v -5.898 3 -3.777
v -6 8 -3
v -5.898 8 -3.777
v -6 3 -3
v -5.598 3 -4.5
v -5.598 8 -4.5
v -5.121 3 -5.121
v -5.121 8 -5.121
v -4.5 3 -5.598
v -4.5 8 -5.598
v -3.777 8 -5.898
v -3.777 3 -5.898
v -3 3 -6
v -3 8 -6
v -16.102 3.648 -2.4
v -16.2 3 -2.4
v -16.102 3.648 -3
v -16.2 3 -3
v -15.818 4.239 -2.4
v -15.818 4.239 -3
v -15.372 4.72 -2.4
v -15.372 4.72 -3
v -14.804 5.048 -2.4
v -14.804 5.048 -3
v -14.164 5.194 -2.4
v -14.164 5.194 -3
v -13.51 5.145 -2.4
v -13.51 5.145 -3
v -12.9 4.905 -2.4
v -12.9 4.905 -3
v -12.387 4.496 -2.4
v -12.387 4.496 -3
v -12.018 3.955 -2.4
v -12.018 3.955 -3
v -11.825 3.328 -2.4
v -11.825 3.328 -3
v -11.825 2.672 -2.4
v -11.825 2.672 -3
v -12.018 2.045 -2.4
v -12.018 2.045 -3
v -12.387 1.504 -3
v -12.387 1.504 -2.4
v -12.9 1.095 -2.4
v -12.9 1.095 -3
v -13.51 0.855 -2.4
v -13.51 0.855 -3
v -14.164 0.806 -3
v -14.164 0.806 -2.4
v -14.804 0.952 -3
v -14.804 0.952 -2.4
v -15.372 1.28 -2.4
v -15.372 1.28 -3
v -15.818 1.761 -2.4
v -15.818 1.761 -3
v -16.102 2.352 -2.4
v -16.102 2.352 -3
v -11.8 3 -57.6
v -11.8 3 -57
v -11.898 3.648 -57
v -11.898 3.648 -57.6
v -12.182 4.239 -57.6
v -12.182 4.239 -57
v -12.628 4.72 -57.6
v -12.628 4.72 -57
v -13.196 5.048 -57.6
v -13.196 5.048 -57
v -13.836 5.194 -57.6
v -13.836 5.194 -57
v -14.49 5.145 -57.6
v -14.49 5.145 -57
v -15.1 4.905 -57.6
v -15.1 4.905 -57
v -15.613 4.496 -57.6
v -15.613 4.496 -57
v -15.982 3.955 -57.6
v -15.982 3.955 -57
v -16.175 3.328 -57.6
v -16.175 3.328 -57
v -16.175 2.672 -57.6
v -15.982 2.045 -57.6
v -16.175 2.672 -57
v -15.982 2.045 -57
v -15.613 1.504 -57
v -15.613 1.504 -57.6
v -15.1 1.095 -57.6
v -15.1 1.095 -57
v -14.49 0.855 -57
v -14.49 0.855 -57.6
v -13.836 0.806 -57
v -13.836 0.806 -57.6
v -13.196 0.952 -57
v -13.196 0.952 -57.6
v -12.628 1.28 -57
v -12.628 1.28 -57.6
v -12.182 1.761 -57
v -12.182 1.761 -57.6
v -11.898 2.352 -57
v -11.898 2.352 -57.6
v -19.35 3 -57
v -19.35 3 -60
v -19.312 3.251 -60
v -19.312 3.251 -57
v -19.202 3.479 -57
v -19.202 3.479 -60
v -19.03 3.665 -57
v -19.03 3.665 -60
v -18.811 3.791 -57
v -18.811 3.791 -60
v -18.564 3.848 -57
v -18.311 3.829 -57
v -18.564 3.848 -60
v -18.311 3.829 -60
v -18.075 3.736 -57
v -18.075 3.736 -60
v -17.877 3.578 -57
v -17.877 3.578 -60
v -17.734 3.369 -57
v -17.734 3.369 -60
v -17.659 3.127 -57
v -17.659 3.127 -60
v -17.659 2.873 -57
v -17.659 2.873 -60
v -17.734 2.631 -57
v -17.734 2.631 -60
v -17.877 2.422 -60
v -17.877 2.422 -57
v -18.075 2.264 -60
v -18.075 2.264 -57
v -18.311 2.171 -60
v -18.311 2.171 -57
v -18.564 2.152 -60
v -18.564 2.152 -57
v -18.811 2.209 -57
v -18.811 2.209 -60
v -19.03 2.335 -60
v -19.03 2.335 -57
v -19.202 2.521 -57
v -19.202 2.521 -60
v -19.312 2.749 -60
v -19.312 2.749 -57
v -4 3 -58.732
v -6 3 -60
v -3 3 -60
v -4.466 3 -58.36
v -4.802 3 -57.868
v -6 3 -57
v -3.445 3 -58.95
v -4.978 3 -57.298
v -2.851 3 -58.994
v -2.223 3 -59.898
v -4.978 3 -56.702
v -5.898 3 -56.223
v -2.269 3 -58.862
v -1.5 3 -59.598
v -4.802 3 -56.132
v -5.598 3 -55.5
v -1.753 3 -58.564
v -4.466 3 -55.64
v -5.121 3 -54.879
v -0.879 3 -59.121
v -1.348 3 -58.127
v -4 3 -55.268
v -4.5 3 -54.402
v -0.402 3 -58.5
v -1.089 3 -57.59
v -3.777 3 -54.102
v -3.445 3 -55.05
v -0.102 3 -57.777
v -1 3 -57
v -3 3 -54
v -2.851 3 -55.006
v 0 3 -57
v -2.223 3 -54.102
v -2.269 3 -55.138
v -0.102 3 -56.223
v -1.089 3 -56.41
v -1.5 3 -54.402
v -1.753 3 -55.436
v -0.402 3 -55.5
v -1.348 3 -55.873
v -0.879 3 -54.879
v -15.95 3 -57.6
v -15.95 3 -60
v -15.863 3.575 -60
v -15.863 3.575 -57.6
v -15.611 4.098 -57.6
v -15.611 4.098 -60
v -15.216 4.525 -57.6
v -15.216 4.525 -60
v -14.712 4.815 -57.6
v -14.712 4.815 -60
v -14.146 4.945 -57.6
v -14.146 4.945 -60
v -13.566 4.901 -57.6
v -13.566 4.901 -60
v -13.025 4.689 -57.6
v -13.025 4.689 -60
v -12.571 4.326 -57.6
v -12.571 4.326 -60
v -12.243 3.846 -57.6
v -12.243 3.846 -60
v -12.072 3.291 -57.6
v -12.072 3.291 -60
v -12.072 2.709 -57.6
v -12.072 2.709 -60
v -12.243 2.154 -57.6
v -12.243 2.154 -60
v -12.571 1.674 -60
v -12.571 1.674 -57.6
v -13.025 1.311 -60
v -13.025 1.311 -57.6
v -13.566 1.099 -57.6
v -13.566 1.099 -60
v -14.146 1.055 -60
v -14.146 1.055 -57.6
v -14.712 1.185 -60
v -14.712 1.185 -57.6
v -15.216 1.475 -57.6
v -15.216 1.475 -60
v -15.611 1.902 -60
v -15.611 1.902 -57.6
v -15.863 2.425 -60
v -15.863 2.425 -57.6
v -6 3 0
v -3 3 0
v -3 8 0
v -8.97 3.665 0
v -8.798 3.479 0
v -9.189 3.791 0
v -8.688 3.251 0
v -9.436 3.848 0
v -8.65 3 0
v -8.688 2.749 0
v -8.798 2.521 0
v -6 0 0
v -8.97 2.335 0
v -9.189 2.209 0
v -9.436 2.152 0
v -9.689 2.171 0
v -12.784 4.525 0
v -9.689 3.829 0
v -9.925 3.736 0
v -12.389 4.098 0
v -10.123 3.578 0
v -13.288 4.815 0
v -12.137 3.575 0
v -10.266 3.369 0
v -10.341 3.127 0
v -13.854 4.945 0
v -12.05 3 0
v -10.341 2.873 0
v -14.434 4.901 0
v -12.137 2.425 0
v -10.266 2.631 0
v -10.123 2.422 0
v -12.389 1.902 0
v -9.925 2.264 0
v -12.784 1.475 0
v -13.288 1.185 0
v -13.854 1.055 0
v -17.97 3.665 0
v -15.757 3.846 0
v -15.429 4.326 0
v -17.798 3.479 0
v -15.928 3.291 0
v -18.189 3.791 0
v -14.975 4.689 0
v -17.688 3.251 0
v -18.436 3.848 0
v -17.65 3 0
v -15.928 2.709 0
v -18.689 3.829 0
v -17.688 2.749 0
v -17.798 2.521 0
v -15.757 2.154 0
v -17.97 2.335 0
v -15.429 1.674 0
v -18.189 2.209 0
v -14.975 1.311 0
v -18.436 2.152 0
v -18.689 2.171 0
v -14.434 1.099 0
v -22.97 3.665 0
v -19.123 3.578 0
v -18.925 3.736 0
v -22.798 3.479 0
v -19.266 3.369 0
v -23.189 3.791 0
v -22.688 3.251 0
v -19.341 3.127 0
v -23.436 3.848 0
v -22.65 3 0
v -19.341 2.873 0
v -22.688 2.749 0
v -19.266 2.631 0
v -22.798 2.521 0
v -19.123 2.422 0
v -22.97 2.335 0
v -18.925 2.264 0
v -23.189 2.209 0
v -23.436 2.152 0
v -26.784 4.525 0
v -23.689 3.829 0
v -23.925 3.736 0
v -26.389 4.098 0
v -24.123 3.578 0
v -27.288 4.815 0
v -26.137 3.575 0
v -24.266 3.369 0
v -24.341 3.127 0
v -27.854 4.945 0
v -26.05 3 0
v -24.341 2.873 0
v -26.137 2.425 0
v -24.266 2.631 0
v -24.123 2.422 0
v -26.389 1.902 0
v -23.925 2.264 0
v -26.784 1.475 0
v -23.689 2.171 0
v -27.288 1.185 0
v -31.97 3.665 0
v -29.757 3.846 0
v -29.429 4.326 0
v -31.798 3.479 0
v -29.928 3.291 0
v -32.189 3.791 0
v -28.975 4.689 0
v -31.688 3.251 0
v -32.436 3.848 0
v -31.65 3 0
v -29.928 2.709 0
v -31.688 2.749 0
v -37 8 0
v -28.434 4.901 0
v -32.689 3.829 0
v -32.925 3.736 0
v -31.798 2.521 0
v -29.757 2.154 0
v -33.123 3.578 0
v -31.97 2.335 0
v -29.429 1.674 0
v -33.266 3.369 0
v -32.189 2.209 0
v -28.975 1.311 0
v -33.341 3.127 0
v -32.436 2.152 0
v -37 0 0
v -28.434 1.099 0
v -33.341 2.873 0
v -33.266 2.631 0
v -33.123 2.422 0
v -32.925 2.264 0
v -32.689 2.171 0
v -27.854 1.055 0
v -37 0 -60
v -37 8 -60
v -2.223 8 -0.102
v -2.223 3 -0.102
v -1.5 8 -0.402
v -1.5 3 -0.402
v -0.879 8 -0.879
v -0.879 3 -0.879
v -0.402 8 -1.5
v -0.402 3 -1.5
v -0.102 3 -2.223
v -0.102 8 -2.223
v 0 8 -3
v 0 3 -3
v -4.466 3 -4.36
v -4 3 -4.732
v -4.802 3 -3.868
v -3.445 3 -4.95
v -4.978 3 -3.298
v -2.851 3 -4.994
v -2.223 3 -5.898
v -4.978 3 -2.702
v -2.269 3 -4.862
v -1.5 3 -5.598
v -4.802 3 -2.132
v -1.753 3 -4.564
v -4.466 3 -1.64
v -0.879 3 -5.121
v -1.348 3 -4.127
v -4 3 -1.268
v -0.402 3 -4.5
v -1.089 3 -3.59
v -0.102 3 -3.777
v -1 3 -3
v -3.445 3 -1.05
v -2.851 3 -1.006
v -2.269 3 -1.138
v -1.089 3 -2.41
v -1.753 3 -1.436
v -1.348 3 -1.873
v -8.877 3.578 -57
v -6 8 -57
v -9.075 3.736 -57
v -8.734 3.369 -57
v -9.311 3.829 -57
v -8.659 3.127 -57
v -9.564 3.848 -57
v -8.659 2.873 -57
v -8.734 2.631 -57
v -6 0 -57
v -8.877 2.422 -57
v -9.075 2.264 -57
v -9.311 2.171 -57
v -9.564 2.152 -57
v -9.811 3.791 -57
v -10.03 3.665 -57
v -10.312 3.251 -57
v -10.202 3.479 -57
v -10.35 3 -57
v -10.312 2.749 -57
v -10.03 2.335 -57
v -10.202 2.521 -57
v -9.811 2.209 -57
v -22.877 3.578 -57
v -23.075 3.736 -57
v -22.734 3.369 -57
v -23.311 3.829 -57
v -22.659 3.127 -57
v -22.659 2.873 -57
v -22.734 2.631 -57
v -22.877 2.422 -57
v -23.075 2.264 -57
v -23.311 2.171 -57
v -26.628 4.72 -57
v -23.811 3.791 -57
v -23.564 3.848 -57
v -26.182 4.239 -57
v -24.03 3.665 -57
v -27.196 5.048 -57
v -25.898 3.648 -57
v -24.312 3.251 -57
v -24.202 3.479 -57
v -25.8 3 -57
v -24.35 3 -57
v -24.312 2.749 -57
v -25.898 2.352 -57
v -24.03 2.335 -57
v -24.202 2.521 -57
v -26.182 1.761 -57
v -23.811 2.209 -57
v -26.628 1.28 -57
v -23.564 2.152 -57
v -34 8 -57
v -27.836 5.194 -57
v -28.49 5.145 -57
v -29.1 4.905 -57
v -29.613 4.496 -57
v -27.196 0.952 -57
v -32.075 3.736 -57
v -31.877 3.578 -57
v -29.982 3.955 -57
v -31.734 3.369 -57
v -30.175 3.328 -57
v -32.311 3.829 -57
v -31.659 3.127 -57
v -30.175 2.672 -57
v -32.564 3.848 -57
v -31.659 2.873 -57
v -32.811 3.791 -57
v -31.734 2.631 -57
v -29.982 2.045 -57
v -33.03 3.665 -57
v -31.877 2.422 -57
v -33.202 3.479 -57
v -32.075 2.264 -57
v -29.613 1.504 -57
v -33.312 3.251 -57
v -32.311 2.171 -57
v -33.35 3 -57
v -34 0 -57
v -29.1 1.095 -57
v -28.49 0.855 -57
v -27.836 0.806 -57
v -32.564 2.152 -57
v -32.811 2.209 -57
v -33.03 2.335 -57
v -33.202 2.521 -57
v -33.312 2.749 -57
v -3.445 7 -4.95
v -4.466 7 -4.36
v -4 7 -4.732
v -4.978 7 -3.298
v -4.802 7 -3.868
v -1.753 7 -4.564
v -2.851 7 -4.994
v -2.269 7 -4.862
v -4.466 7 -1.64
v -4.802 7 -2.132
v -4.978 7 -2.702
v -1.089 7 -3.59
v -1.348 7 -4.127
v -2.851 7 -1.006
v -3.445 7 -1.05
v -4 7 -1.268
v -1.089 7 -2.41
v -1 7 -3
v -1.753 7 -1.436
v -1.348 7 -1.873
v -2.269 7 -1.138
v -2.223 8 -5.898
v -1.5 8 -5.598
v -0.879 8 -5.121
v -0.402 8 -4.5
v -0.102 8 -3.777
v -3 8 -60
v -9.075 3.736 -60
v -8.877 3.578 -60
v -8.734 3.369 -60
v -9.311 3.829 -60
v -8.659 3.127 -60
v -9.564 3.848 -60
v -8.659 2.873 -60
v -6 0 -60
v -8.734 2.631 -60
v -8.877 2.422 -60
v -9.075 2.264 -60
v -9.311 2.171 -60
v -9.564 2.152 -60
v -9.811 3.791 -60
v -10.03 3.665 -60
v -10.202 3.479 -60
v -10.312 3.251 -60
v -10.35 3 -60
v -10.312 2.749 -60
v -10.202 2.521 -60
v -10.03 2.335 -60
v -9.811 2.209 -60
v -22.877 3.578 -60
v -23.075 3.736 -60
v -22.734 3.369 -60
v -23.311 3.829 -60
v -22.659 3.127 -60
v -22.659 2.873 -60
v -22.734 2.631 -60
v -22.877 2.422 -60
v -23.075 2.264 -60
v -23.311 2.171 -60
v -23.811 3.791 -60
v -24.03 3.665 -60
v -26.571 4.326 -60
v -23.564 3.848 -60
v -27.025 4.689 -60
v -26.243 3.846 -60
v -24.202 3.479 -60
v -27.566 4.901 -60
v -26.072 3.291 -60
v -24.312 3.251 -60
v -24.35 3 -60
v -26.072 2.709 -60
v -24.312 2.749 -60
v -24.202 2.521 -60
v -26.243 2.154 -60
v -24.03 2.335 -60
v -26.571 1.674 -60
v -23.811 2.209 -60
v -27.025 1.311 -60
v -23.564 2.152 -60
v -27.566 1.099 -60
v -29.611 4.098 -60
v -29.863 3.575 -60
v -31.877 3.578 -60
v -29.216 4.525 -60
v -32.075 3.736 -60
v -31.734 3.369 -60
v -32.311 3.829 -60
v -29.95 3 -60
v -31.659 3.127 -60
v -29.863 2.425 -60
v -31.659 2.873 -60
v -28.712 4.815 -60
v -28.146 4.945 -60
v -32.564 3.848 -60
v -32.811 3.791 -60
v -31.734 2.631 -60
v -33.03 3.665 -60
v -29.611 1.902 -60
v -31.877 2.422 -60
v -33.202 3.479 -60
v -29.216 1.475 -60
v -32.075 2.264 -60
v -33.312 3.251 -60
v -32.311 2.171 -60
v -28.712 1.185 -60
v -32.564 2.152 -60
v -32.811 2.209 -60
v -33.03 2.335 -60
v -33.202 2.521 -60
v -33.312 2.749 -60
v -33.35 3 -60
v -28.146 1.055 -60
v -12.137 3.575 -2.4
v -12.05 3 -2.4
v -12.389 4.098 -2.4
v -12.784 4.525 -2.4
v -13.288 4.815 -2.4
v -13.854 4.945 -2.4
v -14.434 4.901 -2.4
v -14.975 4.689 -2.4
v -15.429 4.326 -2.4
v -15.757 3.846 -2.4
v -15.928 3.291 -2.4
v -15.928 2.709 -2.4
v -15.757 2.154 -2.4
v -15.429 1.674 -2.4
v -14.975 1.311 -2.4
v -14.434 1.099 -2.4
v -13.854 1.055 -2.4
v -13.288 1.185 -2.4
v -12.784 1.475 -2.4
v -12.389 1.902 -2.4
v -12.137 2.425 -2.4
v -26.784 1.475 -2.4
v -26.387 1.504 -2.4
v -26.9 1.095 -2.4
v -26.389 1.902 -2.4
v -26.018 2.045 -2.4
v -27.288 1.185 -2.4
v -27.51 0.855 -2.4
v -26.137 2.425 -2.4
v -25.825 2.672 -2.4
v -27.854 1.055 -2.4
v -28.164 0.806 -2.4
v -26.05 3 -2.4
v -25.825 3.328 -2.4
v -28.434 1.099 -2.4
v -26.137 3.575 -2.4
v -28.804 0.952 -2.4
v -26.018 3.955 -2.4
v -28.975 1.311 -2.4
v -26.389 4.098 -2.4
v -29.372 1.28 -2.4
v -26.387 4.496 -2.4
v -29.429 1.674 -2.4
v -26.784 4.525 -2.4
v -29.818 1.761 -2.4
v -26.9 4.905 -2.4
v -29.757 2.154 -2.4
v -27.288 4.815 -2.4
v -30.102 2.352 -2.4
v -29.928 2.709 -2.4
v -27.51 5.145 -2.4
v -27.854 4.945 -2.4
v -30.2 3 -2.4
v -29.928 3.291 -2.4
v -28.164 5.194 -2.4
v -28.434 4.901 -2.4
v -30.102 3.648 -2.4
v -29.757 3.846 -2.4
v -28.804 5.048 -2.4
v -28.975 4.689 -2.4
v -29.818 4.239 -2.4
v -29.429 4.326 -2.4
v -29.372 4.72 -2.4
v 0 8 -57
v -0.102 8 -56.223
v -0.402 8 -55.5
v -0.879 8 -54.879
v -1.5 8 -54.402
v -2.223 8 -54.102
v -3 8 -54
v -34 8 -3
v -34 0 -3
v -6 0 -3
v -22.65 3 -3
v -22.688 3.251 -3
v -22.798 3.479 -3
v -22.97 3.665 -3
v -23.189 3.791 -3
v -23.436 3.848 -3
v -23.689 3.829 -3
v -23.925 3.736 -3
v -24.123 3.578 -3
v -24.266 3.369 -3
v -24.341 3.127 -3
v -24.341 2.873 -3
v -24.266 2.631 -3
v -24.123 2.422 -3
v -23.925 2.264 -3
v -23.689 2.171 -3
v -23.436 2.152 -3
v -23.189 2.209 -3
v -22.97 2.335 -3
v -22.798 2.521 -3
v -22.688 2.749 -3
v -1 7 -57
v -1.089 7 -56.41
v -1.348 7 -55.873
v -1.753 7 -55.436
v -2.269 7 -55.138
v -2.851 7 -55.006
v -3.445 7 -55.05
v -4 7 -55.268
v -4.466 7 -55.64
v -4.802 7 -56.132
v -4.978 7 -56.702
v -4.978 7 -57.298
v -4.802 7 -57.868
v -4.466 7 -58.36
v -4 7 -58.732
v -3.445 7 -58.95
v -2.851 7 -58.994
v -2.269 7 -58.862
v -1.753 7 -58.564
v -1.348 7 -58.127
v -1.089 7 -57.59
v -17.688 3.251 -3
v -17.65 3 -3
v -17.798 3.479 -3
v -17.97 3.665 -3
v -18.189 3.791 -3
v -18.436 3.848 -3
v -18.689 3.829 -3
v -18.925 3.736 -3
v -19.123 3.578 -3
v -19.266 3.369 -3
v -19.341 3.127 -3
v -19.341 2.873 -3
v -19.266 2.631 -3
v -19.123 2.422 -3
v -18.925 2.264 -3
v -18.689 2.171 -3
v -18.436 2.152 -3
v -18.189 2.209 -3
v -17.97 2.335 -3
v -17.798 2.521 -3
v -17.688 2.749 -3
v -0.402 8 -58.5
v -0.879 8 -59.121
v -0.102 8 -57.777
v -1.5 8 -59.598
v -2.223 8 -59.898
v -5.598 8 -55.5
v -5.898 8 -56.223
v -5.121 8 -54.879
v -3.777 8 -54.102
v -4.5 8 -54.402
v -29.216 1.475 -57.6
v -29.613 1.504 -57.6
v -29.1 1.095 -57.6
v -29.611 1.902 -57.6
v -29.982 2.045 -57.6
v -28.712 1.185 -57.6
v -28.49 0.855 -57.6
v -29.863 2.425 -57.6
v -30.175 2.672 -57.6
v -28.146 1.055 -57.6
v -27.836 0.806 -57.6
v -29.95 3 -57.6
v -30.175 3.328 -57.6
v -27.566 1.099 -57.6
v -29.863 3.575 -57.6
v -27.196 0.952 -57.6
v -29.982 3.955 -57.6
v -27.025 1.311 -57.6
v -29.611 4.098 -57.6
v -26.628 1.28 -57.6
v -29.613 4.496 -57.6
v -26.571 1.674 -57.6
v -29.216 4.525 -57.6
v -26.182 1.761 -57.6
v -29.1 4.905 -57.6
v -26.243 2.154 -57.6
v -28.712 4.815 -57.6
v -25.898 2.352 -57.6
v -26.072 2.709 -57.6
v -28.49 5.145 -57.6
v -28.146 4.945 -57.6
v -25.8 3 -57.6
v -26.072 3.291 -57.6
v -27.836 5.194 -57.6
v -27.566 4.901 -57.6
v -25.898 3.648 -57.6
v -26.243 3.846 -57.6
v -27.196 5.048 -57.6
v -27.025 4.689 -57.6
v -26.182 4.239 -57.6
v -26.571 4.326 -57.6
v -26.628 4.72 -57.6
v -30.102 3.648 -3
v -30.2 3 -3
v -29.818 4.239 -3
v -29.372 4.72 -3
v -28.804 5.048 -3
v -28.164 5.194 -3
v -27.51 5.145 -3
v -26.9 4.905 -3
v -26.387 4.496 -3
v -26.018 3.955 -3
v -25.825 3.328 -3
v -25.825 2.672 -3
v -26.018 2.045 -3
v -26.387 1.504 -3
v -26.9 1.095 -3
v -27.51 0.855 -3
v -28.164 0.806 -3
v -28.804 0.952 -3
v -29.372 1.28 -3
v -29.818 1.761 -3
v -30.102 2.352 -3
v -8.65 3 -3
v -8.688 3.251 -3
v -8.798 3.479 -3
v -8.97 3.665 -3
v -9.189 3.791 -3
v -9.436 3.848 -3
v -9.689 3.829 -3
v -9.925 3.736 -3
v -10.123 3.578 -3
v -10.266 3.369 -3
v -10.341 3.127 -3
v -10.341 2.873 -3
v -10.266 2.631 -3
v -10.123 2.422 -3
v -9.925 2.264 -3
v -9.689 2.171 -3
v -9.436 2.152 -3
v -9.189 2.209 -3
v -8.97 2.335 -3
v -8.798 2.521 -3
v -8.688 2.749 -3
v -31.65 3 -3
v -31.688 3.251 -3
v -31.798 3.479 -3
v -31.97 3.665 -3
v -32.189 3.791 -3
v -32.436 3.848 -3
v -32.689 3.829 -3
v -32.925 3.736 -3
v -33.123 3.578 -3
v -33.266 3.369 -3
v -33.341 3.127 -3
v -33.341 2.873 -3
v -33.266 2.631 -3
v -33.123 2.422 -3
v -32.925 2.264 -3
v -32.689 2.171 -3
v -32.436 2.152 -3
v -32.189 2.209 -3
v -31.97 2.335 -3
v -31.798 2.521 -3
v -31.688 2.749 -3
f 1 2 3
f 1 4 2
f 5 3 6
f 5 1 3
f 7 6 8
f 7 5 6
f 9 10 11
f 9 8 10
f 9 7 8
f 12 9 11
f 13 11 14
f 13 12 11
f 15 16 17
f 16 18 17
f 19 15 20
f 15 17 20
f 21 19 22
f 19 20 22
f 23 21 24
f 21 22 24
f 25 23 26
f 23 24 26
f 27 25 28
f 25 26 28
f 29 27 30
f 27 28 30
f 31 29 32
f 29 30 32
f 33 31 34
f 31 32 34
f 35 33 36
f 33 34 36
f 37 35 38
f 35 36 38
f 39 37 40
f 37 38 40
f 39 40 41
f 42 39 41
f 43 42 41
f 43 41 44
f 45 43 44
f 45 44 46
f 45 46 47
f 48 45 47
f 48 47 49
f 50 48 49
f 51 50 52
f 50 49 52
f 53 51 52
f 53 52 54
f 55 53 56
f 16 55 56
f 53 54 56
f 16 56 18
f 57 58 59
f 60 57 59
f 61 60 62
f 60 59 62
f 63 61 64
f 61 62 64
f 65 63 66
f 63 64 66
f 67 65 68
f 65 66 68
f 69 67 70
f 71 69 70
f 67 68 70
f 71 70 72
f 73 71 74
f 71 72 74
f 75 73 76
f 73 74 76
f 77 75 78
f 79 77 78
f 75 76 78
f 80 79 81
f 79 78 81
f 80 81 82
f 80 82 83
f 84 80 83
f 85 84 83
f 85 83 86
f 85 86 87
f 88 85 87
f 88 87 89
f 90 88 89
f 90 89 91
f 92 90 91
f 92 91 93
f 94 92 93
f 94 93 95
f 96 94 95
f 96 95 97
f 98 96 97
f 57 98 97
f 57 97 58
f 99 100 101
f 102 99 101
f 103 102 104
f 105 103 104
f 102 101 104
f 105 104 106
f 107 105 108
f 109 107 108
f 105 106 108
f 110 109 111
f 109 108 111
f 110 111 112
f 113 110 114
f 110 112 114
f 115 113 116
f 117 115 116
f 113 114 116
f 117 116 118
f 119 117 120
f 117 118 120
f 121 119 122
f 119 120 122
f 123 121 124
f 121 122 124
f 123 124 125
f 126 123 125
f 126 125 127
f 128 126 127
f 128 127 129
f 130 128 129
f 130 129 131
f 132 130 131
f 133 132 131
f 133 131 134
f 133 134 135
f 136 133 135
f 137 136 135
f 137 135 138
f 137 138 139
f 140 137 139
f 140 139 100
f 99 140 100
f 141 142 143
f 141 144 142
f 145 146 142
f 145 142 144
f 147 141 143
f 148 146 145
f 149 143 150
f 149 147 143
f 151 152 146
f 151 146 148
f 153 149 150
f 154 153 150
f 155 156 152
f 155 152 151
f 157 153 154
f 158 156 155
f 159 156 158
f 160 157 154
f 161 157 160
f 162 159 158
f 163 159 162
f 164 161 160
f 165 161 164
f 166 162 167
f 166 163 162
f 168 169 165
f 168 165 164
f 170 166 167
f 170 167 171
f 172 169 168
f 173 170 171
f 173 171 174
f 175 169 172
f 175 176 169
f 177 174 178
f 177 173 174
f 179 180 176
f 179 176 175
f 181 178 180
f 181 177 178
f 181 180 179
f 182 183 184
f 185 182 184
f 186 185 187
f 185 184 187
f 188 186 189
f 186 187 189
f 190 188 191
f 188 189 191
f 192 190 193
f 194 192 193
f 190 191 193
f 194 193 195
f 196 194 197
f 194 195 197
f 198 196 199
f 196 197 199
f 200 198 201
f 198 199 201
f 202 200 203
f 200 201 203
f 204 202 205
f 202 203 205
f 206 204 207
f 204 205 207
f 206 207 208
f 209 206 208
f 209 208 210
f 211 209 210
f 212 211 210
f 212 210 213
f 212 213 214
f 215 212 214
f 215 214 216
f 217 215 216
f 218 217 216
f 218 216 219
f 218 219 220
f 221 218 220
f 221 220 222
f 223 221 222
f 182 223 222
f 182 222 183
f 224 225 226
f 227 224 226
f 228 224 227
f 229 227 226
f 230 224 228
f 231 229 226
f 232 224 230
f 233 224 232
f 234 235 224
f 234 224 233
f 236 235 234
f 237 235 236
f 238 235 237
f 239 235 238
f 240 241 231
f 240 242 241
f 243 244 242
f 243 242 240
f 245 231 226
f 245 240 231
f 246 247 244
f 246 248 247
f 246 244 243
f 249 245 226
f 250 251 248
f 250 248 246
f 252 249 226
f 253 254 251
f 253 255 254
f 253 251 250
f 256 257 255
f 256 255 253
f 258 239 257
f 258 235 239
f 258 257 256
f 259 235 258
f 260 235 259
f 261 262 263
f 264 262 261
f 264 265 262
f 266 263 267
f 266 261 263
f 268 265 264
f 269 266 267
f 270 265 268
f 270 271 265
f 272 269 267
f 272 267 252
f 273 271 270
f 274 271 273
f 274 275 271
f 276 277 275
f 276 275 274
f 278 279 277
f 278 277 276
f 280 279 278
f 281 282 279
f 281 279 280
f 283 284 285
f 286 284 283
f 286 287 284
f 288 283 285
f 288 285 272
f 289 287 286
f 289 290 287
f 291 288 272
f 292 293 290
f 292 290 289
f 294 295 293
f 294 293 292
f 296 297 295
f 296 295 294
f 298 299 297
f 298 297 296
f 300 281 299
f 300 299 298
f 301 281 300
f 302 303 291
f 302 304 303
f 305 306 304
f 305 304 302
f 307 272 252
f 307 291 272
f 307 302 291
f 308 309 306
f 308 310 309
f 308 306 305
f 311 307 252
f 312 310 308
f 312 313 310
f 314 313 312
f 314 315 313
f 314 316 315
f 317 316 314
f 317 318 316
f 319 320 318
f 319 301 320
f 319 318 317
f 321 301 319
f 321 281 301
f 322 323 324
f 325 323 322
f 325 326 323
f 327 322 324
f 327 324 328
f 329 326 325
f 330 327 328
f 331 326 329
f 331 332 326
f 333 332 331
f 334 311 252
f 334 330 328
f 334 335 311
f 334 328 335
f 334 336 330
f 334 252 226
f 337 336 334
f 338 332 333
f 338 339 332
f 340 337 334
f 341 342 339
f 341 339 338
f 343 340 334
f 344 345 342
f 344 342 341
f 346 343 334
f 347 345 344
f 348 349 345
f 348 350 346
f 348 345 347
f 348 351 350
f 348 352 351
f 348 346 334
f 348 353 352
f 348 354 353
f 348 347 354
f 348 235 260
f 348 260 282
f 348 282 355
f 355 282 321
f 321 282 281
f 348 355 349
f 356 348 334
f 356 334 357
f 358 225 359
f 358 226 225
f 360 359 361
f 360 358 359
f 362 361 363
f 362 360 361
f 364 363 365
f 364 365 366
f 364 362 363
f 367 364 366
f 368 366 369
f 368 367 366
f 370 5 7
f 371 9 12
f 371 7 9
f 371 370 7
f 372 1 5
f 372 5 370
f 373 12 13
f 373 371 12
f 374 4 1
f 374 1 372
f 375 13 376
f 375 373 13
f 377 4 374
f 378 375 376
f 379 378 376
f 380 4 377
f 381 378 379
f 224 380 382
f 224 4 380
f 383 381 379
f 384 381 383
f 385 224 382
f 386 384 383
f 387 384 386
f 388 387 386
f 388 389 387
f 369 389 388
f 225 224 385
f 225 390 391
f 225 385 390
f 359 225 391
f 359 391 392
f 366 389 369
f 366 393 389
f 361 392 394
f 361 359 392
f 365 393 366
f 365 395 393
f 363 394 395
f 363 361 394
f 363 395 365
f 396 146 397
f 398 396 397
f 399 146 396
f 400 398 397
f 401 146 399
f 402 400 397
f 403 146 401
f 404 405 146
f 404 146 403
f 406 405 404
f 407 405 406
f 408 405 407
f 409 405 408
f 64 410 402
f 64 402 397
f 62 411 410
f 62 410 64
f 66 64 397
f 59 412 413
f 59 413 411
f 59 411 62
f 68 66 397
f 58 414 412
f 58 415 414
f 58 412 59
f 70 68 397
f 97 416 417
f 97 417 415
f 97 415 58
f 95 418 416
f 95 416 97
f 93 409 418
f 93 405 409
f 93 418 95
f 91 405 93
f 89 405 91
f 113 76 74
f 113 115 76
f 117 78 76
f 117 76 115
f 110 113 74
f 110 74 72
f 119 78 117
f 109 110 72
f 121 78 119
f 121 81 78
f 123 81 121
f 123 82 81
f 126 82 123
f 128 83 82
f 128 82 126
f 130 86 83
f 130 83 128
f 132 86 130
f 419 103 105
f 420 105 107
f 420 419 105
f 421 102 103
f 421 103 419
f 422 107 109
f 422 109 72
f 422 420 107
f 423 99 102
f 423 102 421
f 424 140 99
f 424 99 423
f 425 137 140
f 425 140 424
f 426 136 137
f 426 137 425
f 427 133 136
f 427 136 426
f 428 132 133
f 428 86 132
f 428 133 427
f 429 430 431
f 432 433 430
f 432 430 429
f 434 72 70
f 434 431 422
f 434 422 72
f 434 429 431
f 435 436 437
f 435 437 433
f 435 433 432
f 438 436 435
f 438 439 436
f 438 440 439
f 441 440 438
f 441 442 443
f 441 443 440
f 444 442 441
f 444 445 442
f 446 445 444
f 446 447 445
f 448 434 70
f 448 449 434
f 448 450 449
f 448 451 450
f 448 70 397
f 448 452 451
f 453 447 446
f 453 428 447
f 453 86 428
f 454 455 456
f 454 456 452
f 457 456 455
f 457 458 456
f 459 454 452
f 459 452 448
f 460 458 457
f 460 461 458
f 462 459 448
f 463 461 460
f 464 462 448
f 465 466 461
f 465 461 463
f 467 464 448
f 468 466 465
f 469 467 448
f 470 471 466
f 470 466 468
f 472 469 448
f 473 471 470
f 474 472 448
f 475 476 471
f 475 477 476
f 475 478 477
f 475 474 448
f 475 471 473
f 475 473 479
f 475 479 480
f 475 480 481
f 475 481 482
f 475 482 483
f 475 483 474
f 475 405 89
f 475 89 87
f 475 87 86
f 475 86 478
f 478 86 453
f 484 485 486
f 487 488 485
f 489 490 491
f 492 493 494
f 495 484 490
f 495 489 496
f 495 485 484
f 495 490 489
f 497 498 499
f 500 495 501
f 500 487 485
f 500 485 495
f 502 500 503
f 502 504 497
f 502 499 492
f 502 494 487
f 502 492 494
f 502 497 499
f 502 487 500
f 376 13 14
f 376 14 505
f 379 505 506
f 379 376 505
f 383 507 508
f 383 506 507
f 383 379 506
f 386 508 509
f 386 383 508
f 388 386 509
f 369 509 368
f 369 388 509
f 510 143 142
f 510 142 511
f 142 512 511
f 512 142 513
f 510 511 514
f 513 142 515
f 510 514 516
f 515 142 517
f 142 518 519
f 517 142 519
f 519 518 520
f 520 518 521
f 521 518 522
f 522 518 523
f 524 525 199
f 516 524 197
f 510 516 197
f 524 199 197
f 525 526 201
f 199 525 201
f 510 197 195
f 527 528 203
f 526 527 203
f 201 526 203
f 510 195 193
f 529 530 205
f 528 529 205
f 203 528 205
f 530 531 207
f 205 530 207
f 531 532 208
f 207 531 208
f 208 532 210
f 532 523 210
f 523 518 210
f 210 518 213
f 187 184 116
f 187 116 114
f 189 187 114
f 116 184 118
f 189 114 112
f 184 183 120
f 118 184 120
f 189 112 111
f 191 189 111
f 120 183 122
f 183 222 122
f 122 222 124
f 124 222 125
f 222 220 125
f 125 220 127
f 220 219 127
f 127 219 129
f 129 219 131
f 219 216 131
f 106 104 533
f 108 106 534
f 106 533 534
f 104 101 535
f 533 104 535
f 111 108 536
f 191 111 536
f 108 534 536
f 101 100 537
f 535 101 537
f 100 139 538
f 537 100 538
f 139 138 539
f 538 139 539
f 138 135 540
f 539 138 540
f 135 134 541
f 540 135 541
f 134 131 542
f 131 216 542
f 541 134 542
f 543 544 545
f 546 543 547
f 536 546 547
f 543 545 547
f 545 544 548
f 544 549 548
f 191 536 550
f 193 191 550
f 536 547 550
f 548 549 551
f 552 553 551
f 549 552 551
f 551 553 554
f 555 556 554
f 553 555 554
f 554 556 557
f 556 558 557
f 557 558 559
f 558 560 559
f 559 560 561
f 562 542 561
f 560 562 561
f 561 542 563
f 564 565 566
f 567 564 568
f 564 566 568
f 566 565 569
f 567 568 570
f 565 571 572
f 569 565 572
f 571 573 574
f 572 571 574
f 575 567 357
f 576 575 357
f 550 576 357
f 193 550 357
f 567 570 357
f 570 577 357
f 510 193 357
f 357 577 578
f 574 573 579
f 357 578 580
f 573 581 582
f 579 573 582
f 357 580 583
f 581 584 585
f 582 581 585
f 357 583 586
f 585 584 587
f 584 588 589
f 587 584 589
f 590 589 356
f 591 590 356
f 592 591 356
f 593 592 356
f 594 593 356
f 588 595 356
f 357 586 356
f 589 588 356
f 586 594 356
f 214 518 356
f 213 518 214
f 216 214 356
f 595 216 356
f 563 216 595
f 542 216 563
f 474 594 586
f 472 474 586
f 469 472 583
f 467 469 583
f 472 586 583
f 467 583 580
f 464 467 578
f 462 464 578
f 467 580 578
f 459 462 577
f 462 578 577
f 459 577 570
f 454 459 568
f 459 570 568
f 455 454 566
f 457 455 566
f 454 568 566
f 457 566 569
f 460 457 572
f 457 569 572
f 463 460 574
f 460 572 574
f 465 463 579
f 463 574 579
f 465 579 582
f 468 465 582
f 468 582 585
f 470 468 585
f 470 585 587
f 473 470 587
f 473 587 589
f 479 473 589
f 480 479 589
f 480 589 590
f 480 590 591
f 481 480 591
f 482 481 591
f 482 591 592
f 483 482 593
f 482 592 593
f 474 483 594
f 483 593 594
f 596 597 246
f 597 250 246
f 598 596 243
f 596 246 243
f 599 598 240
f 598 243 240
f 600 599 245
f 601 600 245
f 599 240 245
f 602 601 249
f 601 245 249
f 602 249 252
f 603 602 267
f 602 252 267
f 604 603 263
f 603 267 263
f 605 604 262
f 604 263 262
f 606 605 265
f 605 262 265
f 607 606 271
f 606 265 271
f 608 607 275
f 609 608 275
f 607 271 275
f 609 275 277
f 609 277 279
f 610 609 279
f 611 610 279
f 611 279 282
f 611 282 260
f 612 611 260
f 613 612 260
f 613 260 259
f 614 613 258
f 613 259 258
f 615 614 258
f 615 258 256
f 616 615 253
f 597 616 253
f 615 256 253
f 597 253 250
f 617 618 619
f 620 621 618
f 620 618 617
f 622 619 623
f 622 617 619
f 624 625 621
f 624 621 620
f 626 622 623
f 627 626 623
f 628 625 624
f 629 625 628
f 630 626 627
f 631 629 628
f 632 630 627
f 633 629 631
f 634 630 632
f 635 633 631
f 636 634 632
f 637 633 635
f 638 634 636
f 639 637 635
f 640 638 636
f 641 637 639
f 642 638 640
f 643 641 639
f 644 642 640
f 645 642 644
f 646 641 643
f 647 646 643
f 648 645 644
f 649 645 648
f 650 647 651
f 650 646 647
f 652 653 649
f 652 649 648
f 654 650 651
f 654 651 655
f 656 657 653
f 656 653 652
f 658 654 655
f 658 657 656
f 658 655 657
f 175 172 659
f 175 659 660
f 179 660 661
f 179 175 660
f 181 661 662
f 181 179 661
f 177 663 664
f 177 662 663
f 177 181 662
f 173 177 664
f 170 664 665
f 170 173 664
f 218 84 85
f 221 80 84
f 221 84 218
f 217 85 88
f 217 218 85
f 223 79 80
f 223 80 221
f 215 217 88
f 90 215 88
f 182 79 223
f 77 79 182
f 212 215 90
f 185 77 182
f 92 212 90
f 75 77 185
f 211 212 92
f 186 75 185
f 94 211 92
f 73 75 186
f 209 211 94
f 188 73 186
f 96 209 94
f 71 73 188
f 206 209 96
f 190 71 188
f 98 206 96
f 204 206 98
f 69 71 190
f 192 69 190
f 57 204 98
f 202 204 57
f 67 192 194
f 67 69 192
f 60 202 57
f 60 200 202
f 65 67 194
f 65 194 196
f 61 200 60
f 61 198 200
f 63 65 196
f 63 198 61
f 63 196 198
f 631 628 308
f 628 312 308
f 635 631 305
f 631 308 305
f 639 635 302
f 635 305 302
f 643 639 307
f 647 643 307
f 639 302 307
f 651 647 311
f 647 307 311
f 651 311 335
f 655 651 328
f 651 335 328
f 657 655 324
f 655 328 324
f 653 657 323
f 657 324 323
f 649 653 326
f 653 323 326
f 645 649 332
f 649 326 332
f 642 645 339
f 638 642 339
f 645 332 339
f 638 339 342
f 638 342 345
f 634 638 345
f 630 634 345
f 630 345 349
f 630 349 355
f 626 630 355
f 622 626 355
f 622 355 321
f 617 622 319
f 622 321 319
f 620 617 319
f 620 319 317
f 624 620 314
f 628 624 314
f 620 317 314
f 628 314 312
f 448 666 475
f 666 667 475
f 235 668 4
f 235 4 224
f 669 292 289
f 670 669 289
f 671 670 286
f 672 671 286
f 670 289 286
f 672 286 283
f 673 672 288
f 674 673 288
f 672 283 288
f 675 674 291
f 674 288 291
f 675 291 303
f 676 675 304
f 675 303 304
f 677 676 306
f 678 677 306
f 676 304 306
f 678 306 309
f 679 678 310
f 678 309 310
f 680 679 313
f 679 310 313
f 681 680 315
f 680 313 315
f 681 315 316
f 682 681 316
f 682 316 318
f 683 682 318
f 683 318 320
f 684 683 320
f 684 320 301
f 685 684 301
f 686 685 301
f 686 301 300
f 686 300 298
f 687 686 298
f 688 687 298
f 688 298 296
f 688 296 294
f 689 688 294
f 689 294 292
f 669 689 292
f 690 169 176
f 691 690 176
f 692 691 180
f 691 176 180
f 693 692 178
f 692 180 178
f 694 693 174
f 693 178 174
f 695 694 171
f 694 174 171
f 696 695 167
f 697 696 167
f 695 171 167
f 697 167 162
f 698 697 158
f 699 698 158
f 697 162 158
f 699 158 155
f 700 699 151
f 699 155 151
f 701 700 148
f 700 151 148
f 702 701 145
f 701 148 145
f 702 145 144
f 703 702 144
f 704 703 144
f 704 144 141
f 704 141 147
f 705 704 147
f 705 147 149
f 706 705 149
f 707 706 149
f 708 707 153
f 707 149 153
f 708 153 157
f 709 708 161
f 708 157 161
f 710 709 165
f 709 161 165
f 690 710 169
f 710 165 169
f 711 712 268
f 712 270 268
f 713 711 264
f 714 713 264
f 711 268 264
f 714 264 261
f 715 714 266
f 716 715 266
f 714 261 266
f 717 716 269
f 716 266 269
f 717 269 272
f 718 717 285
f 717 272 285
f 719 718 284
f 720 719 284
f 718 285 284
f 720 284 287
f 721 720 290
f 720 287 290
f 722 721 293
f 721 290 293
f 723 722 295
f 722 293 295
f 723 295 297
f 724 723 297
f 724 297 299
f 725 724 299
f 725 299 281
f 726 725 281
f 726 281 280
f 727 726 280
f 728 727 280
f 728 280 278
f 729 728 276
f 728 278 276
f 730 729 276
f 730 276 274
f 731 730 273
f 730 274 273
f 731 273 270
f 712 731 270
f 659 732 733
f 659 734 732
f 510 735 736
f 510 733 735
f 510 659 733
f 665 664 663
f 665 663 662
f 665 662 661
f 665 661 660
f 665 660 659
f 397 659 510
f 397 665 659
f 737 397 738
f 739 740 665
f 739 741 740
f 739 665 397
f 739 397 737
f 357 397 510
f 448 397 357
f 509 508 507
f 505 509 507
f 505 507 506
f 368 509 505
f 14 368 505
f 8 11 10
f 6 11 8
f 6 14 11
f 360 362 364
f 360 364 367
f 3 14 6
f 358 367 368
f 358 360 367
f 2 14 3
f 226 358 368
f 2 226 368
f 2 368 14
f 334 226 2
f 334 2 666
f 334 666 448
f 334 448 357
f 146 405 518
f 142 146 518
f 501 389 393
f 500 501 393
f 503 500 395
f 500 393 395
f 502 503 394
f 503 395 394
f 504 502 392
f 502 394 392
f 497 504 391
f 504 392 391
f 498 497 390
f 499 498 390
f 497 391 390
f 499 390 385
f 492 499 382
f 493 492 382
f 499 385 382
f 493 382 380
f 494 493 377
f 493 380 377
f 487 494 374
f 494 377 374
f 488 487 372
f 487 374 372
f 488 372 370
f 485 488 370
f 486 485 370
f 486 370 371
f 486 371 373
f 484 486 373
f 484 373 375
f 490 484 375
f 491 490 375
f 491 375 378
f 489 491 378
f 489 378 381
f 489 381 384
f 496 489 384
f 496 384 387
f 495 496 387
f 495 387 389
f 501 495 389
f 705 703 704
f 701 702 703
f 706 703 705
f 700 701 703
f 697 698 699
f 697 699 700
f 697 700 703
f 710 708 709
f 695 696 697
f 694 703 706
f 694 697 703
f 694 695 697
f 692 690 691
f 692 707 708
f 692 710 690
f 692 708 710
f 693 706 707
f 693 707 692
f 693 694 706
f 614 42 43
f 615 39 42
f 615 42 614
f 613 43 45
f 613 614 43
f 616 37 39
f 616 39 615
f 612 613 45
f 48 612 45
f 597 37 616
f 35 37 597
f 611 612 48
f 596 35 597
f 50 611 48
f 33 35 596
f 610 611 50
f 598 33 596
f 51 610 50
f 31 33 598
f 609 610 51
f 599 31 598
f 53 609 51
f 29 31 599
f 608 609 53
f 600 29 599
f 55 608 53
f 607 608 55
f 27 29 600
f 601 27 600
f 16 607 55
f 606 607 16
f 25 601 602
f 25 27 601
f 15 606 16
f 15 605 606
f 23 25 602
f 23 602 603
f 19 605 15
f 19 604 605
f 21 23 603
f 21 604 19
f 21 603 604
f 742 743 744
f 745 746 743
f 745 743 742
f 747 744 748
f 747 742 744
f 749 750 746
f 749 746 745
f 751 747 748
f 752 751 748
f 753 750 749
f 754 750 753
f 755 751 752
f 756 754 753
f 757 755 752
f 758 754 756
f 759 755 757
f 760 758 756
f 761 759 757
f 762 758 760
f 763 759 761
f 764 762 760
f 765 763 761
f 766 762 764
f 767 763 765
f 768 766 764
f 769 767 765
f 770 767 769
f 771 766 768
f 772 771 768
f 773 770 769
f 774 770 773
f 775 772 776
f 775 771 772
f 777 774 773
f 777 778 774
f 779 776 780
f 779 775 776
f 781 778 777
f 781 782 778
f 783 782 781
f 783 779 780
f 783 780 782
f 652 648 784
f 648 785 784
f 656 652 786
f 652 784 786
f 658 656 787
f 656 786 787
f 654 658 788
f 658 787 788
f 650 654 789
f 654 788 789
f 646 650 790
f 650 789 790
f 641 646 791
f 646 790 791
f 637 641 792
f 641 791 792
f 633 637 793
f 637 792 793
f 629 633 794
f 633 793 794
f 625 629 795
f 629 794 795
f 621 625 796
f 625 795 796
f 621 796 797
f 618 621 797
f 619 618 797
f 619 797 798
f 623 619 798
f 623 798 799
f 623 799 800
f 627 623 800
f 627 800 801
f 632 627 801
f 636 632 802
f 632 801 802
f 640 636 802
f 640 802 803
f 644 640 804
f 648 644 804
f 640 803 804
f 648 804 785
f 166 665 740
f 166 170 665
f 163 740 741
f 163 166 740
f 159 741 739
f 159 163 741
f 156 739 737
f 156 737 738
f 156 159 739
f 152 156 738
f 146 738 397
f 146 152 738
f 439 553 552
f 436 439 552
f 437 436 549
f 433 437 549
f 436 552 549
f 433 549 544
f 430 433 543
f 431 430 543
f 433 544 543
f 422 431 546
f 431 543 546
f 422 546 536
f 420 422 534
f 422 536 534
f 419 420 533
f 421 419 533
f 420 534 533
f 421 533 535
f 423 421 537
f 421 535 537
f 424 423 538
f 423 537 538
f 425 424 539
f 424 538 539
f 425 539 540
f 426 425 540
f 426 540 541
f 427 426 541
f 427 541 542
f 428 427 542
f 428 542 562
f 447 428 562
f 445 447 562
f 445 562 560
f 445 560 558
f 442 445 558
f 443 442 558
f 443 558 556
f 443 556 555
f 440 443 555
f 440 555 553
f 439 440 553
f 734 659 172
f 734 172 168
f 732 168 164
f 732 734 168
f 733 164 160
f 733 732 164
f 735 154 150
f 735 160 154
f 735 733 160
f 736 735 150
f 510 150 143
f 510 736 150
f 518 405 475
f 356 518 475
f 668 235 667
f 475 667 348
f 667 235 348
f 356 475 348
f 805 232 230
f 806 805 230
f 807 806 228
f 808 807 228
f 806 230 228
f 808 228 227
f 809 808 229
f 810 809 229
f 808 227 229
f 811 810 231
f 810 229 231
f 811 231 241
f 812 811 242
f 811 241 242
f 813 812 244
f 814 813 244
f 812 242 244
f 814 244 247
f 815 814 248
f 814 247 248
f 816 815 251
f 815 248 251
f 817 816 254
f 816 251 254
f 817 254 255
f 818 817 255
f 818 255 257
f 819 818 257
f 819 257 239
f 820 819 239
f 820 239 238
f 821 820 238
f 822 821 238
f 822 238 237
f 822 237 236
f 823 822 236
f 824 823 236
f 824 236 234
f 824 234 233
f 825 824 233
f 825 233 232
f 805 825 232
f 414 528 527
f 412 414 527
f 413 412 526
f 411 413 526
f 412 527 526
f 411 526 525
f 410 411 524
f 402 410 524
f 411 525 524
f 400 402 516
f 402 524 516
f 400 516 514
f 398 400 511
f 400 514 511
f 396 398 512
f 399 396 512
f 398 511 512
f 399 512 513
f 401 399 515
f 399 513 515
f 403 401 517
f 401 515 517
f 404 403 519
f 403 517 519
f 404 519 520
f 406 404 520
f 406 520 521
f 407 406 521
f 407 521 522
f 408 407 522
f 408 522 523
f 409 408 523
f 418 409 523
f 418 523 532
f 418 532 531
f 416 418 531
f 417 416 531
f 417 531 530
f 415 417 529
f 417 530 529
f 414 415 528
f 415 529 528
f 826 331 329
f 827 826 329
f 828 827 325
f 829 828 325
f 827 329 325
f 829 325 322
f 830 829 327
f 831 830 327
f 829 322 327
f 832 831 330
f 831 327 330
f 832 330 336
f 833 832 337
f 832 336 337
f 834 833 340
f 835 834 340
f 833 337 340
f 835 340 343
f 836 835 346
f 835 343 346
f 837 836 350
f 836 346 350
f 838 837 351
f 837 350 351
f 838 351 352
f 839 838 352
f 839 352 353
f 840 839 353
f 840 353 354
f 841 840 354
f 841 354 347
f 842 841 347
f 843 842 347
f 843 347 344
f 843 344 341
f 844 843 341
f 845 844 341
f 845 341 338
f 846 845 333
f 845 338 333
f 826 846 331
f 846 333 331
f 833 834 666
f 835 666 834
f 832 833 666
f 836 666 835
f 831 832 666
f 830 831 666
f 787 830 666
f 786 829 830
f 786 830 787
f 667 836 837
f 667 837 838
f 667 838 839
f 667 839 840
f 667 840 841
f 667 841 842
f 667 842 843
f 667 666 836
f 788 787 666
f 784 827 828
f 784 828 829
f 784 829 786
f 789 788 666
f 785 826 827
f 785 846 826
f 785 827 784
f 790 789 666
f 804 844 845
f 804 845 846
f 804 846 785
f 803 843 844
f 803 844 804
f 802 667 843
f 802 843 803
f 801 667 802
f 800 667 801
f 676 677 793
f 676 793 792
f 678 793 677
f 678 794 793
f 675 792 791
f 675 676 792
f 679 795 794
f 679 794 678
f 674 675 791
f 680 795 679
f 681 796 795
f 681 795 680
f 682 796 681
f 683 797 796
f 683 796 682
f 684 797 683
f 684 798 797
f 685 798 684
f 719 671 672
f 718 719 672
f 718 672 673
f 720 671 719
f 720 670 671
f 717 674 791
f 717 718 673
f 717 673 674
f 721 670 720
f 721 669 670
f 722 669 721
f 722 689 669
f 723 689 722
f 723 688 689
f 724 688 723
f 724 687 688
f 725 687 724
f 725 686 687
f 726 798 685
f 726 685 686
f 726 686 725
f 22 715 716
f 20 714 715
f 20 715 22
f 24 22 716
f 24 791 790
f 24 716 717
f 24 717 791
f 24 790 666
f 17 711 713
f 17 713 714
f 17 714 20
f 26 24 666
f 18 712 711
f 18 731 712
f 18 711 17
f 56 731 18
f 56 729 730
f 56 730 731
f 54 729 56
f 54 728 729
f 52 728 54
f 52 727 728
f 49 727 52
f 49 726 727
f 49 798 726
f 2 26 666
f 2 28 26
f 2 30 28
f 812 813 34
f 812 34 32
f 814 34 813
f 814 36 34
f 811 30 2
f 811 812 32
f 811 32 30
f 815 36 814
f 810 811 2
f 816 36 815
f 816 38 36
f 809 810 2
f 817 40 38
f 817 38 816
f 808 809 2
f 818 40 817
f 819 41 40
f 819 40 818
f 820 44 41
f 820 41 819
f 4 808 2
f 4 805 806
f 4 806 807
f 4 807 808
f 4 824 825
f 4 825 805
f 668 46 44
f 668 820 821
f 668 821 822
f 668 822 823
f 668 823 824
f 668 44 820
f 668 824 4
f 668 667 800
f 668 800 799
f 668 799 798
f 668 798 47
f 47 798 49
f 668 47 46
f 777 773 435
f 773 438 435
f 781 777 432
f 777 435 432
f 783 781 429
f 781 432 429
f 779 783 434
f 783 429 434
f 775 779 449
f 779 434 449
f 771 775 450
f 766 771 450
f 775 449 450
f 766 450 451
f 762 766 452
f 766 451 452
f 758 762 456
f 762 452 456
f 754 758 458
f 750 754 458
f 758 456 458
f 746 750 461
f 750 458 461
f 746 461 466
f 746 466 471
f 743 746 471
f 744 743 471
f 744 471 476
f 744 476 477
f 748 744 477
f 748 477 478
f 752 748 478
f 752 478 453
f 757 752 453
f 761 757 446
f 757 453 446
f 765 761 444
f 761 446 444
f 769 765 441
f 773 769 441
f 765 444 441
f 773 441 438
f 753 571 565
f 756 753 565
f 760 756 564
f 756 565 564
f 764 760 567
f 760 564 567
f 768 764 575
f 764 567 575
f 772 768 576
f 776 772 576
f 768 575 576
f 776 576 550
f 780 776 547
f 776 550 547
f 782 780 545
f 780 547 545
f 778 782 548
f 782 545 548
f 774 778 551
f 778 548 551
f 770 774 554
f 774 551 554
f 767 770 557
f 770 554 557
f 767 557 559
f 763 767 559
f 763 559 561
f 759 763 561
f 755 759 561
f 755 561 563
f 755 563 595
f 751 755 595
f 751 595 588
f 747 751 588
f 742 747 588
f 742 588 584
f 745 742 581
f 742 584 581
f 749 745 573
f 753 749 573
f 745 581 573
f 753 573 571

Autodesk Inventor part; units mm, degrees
ref_plane "YZ Plane" through (0, 0, 0) normal (1, 0, 0) x (0, 1, 0)
ref_plane "XZ Plane" through (0, 0, 0) normal (0, 1, 0) x (-1, 0, 0)
ref_plane "XY Plane" through (0, 0, 0) normal (0, 0, 1) x (1, 0, 0)
sketch "Szkic1" plane through (0, 0, 0) normal (0, 1, 0) x (-1, 0, 0)
  line L0 (0, 0) -> (37, 0)
  line L1 (37, 0) -> (37, -3)
  line L2 (37, -3) -> (0, -3)
  line L3 (0, -3) -> (0, 0)
  line L4 (37, 0) -> (34, 0)
  line L5 (34, 0) -> (34, -60)
  line L6 (34, -60) -> (37, -60)
  line L7 (37, -60) -> (37, 0)
  line L8 (37, -60) -> (0, -60)
  line L9 (0, -60) -> (0, -57)
  line L10 (0, -57) -> (37, -57)
  line L11 (37, -57) -> (37, -60)
  point P0 (34, -3)
  point P1 (34, -57)
  dimension "d0" = 37
  dimension "d1" = 3
  dimension "d2" = 3
  dimension "d3" = 60
  dimension "d4" = 37
  dimension "d5" = 3
extrude "Wyciągnięcie proste1" add sketch "Szkic1" along normal blind 8
sketch "Szkic2" plane through (-37, 0, 0) normal (0, 0, 1) x (1, 0, 0)
  circle A0 centre (9, 3) radius 1.95
  line L0 (0, 0) -> (37, 0) projected
  line L1 (0, 0) -> (0, 8) projected
  circle A1 centre (4.5, 3) radius 0.85
  circle A2 centre (13.5, 3) radius 0.85
  circle A3 centre (18.5, 3) radius 0.85
  circle A4 centre (27.5, 3) radius 0.85
  circle A5 centre (23, 3) radius 1.95
  dimension "d8" = 3.9
  dimension "d9" = 3
  dimension "d10" = 9
  dimension "d11" = 1.7
  dimension "d12" = 1.7
  dimension "d13" = 1.7
  dimension "d14" = 1.7
  dimension "d15" = 4.5
  dimension "d16" = 3
  dimension "d17" = 13.5
  dimension "d18" = 3
  dimension "d19" = 5
  dimension "d20" = 3
  dimension "d21" = 3.9
  dimension "d22" = 4.5
  dimension "d23" = 3
  dimension "d24" = 4.5
  dimension "d25" = 3
sketch "Szkic3" plane through (0, 0, -60) normal (0, 0, -1) x (-1, 0, 0)
  circle A0 centre (28, 3) radius 1.95 projected
  circle A1 centre (32.5, 3) radius 0.85 projected
  circle A2 centre (23.5, 3) radius 0.85 projected
  circle A3 centre (18.5, 3) radius 0.85 projected
  circle A4 centre (14, 3) radius 1.95 projected
  circle A5 centre (9.5, 3) radius 0.85 projected
  point P0 (0, 0)
extrude "Wyciągnięcie proste2" cut sketch "Szkic3" against normal blind 3
extrude "Wyciągnięcie proste3" cut sketch "Szkic2" against normal blind 3
sketch "Szkic4" plane through (0, 8, 0) normal (0, 1, 0) x (1, 0, 0)
  line L0 (0, 0) -> (0, 3) projected
  line L1 (0, 0) -> (-6, 0)
  line L2 (-6, 0) -> (-6, 6)
  line L3 (-6, 6) -> (0, 6)
  line L4 (0, 6) -> (0, 0)
  line L5 (0, 60) -> (-37, 60) projected
  line L6 (0, 60) -> (-6, 60)
  line L7 (-6, 60) -> (-6, 54)
  line L8 (-6, 54) -> (0, 54)
  line L9 (0, 54) -> (0, 60)
  dimension "d30" = 6
  dimension "d31" = 6
  dimension "d32" = 6
  dimension "d33" = 6
extrude "Wyciągnięcie proste4" add sketch "Szkic4" against normal blind 8
sketch "Szkic5" plane through (0, 0, 0) normal (0, -1, 0) x (1, 0, 0)
  line L0 (-6, -6) -> (0, -6) projected
  line L1 (0, -6) -> (-6, -6)
  line L2 (-6, -6) -> (-6, 0)
  line L3 (-6, 0) -> (0, 0)
  line L4 (0, 0) -> (0, -6)
  line L5 (0, -54) -> (-6, -54) projected
  line L6 (0, -60) -> (-37, -60) projected
  line L7 (0, -54) -> (-6, -54)
  line L8 (-6, -54) -> (-6, -60)
  line L9 (-6, -60) -> (0, -60)
  line L10 (0, -60) -> (0, -54)
extrude "Wyciągnięcie proste5" cut sketch "Szkic5" against normal blind 3
sketch "Szkic6" plane through (0, 3, 0) normal (0, -1, 0) x (1, 0, 0)
  circle A0 centre (-3, -3) radius 2
  circle A1 centre (-3, -57) radius 2
  line L0 (0, 0) -> (0, -6) projected
  line L1 (-6, 0) -> (0, 0) projected
  line L2 (-6, -54) -> (0, -54) projected
  line L3 (0, -54) -> (0, -60) projected
  point P0 (-3, -54)
  dimension "d38" = 4
  dimension "d39" = 4
  dimension "d40" = 3
  dimension "d41" = 3
  dimension "d42" = 3
  dimension "d43" = 3
extrude "Wyciągnięcie proste6" cut sketch "Szkic6" against normal blind 4
sketch "Szkic7" plane through (-34, 0, -3) normal (0, 0, -1) x (-1, 0, 0)
  circle A0 centre (-6, 3) radius 1.95 projected
  circle A1 centre (-6, 3) radius 2.2
  circle A2 centre (-20, 3) radius 1.95 projected
  circle A3 centre (-20, 3) radius 2.2
  point P0 (-34, 0)
  dimension "d46" = 4.4
  dimension "d47" = 4.4
extrude "Wyciągnięcie proste7" cut sketch "Szkic7" against normal blind 0.6 contours A0 | A1 | A2 | A3
sketch "Szkic8" plane through (-34, 0, -57) normal (0, 0, 1) x (1, 0, 0)
  circle A0 centre (20, 3) radius 2.2 projected
  circle A1 centre (20, 3) radius 2.2
  circle A2 centre (6, 3) radius 2.2 projected
  circle A3 centre (6, 3) radius 2.2
  point P0 (34, 0)
  dimension "d50" = 4.4
  dimension "d51" = 4.4
extrude "Wyciągnięcie proste8" cut sketch "Szkic8" against normal blind 0.6
fillet "Fillet1" radius 3 4 edges at (0, 5.5, 0) (0, 5.5, -6) (0, 5.5, -54) (0, 5.5, -60)
fillet "Zaokrąglenie2" radius 3 2 edges at (-6, 5.5, -54) (-6, 5.5, -6)
properties part number "bmw" material "Tworzywo sztuczne PET"
